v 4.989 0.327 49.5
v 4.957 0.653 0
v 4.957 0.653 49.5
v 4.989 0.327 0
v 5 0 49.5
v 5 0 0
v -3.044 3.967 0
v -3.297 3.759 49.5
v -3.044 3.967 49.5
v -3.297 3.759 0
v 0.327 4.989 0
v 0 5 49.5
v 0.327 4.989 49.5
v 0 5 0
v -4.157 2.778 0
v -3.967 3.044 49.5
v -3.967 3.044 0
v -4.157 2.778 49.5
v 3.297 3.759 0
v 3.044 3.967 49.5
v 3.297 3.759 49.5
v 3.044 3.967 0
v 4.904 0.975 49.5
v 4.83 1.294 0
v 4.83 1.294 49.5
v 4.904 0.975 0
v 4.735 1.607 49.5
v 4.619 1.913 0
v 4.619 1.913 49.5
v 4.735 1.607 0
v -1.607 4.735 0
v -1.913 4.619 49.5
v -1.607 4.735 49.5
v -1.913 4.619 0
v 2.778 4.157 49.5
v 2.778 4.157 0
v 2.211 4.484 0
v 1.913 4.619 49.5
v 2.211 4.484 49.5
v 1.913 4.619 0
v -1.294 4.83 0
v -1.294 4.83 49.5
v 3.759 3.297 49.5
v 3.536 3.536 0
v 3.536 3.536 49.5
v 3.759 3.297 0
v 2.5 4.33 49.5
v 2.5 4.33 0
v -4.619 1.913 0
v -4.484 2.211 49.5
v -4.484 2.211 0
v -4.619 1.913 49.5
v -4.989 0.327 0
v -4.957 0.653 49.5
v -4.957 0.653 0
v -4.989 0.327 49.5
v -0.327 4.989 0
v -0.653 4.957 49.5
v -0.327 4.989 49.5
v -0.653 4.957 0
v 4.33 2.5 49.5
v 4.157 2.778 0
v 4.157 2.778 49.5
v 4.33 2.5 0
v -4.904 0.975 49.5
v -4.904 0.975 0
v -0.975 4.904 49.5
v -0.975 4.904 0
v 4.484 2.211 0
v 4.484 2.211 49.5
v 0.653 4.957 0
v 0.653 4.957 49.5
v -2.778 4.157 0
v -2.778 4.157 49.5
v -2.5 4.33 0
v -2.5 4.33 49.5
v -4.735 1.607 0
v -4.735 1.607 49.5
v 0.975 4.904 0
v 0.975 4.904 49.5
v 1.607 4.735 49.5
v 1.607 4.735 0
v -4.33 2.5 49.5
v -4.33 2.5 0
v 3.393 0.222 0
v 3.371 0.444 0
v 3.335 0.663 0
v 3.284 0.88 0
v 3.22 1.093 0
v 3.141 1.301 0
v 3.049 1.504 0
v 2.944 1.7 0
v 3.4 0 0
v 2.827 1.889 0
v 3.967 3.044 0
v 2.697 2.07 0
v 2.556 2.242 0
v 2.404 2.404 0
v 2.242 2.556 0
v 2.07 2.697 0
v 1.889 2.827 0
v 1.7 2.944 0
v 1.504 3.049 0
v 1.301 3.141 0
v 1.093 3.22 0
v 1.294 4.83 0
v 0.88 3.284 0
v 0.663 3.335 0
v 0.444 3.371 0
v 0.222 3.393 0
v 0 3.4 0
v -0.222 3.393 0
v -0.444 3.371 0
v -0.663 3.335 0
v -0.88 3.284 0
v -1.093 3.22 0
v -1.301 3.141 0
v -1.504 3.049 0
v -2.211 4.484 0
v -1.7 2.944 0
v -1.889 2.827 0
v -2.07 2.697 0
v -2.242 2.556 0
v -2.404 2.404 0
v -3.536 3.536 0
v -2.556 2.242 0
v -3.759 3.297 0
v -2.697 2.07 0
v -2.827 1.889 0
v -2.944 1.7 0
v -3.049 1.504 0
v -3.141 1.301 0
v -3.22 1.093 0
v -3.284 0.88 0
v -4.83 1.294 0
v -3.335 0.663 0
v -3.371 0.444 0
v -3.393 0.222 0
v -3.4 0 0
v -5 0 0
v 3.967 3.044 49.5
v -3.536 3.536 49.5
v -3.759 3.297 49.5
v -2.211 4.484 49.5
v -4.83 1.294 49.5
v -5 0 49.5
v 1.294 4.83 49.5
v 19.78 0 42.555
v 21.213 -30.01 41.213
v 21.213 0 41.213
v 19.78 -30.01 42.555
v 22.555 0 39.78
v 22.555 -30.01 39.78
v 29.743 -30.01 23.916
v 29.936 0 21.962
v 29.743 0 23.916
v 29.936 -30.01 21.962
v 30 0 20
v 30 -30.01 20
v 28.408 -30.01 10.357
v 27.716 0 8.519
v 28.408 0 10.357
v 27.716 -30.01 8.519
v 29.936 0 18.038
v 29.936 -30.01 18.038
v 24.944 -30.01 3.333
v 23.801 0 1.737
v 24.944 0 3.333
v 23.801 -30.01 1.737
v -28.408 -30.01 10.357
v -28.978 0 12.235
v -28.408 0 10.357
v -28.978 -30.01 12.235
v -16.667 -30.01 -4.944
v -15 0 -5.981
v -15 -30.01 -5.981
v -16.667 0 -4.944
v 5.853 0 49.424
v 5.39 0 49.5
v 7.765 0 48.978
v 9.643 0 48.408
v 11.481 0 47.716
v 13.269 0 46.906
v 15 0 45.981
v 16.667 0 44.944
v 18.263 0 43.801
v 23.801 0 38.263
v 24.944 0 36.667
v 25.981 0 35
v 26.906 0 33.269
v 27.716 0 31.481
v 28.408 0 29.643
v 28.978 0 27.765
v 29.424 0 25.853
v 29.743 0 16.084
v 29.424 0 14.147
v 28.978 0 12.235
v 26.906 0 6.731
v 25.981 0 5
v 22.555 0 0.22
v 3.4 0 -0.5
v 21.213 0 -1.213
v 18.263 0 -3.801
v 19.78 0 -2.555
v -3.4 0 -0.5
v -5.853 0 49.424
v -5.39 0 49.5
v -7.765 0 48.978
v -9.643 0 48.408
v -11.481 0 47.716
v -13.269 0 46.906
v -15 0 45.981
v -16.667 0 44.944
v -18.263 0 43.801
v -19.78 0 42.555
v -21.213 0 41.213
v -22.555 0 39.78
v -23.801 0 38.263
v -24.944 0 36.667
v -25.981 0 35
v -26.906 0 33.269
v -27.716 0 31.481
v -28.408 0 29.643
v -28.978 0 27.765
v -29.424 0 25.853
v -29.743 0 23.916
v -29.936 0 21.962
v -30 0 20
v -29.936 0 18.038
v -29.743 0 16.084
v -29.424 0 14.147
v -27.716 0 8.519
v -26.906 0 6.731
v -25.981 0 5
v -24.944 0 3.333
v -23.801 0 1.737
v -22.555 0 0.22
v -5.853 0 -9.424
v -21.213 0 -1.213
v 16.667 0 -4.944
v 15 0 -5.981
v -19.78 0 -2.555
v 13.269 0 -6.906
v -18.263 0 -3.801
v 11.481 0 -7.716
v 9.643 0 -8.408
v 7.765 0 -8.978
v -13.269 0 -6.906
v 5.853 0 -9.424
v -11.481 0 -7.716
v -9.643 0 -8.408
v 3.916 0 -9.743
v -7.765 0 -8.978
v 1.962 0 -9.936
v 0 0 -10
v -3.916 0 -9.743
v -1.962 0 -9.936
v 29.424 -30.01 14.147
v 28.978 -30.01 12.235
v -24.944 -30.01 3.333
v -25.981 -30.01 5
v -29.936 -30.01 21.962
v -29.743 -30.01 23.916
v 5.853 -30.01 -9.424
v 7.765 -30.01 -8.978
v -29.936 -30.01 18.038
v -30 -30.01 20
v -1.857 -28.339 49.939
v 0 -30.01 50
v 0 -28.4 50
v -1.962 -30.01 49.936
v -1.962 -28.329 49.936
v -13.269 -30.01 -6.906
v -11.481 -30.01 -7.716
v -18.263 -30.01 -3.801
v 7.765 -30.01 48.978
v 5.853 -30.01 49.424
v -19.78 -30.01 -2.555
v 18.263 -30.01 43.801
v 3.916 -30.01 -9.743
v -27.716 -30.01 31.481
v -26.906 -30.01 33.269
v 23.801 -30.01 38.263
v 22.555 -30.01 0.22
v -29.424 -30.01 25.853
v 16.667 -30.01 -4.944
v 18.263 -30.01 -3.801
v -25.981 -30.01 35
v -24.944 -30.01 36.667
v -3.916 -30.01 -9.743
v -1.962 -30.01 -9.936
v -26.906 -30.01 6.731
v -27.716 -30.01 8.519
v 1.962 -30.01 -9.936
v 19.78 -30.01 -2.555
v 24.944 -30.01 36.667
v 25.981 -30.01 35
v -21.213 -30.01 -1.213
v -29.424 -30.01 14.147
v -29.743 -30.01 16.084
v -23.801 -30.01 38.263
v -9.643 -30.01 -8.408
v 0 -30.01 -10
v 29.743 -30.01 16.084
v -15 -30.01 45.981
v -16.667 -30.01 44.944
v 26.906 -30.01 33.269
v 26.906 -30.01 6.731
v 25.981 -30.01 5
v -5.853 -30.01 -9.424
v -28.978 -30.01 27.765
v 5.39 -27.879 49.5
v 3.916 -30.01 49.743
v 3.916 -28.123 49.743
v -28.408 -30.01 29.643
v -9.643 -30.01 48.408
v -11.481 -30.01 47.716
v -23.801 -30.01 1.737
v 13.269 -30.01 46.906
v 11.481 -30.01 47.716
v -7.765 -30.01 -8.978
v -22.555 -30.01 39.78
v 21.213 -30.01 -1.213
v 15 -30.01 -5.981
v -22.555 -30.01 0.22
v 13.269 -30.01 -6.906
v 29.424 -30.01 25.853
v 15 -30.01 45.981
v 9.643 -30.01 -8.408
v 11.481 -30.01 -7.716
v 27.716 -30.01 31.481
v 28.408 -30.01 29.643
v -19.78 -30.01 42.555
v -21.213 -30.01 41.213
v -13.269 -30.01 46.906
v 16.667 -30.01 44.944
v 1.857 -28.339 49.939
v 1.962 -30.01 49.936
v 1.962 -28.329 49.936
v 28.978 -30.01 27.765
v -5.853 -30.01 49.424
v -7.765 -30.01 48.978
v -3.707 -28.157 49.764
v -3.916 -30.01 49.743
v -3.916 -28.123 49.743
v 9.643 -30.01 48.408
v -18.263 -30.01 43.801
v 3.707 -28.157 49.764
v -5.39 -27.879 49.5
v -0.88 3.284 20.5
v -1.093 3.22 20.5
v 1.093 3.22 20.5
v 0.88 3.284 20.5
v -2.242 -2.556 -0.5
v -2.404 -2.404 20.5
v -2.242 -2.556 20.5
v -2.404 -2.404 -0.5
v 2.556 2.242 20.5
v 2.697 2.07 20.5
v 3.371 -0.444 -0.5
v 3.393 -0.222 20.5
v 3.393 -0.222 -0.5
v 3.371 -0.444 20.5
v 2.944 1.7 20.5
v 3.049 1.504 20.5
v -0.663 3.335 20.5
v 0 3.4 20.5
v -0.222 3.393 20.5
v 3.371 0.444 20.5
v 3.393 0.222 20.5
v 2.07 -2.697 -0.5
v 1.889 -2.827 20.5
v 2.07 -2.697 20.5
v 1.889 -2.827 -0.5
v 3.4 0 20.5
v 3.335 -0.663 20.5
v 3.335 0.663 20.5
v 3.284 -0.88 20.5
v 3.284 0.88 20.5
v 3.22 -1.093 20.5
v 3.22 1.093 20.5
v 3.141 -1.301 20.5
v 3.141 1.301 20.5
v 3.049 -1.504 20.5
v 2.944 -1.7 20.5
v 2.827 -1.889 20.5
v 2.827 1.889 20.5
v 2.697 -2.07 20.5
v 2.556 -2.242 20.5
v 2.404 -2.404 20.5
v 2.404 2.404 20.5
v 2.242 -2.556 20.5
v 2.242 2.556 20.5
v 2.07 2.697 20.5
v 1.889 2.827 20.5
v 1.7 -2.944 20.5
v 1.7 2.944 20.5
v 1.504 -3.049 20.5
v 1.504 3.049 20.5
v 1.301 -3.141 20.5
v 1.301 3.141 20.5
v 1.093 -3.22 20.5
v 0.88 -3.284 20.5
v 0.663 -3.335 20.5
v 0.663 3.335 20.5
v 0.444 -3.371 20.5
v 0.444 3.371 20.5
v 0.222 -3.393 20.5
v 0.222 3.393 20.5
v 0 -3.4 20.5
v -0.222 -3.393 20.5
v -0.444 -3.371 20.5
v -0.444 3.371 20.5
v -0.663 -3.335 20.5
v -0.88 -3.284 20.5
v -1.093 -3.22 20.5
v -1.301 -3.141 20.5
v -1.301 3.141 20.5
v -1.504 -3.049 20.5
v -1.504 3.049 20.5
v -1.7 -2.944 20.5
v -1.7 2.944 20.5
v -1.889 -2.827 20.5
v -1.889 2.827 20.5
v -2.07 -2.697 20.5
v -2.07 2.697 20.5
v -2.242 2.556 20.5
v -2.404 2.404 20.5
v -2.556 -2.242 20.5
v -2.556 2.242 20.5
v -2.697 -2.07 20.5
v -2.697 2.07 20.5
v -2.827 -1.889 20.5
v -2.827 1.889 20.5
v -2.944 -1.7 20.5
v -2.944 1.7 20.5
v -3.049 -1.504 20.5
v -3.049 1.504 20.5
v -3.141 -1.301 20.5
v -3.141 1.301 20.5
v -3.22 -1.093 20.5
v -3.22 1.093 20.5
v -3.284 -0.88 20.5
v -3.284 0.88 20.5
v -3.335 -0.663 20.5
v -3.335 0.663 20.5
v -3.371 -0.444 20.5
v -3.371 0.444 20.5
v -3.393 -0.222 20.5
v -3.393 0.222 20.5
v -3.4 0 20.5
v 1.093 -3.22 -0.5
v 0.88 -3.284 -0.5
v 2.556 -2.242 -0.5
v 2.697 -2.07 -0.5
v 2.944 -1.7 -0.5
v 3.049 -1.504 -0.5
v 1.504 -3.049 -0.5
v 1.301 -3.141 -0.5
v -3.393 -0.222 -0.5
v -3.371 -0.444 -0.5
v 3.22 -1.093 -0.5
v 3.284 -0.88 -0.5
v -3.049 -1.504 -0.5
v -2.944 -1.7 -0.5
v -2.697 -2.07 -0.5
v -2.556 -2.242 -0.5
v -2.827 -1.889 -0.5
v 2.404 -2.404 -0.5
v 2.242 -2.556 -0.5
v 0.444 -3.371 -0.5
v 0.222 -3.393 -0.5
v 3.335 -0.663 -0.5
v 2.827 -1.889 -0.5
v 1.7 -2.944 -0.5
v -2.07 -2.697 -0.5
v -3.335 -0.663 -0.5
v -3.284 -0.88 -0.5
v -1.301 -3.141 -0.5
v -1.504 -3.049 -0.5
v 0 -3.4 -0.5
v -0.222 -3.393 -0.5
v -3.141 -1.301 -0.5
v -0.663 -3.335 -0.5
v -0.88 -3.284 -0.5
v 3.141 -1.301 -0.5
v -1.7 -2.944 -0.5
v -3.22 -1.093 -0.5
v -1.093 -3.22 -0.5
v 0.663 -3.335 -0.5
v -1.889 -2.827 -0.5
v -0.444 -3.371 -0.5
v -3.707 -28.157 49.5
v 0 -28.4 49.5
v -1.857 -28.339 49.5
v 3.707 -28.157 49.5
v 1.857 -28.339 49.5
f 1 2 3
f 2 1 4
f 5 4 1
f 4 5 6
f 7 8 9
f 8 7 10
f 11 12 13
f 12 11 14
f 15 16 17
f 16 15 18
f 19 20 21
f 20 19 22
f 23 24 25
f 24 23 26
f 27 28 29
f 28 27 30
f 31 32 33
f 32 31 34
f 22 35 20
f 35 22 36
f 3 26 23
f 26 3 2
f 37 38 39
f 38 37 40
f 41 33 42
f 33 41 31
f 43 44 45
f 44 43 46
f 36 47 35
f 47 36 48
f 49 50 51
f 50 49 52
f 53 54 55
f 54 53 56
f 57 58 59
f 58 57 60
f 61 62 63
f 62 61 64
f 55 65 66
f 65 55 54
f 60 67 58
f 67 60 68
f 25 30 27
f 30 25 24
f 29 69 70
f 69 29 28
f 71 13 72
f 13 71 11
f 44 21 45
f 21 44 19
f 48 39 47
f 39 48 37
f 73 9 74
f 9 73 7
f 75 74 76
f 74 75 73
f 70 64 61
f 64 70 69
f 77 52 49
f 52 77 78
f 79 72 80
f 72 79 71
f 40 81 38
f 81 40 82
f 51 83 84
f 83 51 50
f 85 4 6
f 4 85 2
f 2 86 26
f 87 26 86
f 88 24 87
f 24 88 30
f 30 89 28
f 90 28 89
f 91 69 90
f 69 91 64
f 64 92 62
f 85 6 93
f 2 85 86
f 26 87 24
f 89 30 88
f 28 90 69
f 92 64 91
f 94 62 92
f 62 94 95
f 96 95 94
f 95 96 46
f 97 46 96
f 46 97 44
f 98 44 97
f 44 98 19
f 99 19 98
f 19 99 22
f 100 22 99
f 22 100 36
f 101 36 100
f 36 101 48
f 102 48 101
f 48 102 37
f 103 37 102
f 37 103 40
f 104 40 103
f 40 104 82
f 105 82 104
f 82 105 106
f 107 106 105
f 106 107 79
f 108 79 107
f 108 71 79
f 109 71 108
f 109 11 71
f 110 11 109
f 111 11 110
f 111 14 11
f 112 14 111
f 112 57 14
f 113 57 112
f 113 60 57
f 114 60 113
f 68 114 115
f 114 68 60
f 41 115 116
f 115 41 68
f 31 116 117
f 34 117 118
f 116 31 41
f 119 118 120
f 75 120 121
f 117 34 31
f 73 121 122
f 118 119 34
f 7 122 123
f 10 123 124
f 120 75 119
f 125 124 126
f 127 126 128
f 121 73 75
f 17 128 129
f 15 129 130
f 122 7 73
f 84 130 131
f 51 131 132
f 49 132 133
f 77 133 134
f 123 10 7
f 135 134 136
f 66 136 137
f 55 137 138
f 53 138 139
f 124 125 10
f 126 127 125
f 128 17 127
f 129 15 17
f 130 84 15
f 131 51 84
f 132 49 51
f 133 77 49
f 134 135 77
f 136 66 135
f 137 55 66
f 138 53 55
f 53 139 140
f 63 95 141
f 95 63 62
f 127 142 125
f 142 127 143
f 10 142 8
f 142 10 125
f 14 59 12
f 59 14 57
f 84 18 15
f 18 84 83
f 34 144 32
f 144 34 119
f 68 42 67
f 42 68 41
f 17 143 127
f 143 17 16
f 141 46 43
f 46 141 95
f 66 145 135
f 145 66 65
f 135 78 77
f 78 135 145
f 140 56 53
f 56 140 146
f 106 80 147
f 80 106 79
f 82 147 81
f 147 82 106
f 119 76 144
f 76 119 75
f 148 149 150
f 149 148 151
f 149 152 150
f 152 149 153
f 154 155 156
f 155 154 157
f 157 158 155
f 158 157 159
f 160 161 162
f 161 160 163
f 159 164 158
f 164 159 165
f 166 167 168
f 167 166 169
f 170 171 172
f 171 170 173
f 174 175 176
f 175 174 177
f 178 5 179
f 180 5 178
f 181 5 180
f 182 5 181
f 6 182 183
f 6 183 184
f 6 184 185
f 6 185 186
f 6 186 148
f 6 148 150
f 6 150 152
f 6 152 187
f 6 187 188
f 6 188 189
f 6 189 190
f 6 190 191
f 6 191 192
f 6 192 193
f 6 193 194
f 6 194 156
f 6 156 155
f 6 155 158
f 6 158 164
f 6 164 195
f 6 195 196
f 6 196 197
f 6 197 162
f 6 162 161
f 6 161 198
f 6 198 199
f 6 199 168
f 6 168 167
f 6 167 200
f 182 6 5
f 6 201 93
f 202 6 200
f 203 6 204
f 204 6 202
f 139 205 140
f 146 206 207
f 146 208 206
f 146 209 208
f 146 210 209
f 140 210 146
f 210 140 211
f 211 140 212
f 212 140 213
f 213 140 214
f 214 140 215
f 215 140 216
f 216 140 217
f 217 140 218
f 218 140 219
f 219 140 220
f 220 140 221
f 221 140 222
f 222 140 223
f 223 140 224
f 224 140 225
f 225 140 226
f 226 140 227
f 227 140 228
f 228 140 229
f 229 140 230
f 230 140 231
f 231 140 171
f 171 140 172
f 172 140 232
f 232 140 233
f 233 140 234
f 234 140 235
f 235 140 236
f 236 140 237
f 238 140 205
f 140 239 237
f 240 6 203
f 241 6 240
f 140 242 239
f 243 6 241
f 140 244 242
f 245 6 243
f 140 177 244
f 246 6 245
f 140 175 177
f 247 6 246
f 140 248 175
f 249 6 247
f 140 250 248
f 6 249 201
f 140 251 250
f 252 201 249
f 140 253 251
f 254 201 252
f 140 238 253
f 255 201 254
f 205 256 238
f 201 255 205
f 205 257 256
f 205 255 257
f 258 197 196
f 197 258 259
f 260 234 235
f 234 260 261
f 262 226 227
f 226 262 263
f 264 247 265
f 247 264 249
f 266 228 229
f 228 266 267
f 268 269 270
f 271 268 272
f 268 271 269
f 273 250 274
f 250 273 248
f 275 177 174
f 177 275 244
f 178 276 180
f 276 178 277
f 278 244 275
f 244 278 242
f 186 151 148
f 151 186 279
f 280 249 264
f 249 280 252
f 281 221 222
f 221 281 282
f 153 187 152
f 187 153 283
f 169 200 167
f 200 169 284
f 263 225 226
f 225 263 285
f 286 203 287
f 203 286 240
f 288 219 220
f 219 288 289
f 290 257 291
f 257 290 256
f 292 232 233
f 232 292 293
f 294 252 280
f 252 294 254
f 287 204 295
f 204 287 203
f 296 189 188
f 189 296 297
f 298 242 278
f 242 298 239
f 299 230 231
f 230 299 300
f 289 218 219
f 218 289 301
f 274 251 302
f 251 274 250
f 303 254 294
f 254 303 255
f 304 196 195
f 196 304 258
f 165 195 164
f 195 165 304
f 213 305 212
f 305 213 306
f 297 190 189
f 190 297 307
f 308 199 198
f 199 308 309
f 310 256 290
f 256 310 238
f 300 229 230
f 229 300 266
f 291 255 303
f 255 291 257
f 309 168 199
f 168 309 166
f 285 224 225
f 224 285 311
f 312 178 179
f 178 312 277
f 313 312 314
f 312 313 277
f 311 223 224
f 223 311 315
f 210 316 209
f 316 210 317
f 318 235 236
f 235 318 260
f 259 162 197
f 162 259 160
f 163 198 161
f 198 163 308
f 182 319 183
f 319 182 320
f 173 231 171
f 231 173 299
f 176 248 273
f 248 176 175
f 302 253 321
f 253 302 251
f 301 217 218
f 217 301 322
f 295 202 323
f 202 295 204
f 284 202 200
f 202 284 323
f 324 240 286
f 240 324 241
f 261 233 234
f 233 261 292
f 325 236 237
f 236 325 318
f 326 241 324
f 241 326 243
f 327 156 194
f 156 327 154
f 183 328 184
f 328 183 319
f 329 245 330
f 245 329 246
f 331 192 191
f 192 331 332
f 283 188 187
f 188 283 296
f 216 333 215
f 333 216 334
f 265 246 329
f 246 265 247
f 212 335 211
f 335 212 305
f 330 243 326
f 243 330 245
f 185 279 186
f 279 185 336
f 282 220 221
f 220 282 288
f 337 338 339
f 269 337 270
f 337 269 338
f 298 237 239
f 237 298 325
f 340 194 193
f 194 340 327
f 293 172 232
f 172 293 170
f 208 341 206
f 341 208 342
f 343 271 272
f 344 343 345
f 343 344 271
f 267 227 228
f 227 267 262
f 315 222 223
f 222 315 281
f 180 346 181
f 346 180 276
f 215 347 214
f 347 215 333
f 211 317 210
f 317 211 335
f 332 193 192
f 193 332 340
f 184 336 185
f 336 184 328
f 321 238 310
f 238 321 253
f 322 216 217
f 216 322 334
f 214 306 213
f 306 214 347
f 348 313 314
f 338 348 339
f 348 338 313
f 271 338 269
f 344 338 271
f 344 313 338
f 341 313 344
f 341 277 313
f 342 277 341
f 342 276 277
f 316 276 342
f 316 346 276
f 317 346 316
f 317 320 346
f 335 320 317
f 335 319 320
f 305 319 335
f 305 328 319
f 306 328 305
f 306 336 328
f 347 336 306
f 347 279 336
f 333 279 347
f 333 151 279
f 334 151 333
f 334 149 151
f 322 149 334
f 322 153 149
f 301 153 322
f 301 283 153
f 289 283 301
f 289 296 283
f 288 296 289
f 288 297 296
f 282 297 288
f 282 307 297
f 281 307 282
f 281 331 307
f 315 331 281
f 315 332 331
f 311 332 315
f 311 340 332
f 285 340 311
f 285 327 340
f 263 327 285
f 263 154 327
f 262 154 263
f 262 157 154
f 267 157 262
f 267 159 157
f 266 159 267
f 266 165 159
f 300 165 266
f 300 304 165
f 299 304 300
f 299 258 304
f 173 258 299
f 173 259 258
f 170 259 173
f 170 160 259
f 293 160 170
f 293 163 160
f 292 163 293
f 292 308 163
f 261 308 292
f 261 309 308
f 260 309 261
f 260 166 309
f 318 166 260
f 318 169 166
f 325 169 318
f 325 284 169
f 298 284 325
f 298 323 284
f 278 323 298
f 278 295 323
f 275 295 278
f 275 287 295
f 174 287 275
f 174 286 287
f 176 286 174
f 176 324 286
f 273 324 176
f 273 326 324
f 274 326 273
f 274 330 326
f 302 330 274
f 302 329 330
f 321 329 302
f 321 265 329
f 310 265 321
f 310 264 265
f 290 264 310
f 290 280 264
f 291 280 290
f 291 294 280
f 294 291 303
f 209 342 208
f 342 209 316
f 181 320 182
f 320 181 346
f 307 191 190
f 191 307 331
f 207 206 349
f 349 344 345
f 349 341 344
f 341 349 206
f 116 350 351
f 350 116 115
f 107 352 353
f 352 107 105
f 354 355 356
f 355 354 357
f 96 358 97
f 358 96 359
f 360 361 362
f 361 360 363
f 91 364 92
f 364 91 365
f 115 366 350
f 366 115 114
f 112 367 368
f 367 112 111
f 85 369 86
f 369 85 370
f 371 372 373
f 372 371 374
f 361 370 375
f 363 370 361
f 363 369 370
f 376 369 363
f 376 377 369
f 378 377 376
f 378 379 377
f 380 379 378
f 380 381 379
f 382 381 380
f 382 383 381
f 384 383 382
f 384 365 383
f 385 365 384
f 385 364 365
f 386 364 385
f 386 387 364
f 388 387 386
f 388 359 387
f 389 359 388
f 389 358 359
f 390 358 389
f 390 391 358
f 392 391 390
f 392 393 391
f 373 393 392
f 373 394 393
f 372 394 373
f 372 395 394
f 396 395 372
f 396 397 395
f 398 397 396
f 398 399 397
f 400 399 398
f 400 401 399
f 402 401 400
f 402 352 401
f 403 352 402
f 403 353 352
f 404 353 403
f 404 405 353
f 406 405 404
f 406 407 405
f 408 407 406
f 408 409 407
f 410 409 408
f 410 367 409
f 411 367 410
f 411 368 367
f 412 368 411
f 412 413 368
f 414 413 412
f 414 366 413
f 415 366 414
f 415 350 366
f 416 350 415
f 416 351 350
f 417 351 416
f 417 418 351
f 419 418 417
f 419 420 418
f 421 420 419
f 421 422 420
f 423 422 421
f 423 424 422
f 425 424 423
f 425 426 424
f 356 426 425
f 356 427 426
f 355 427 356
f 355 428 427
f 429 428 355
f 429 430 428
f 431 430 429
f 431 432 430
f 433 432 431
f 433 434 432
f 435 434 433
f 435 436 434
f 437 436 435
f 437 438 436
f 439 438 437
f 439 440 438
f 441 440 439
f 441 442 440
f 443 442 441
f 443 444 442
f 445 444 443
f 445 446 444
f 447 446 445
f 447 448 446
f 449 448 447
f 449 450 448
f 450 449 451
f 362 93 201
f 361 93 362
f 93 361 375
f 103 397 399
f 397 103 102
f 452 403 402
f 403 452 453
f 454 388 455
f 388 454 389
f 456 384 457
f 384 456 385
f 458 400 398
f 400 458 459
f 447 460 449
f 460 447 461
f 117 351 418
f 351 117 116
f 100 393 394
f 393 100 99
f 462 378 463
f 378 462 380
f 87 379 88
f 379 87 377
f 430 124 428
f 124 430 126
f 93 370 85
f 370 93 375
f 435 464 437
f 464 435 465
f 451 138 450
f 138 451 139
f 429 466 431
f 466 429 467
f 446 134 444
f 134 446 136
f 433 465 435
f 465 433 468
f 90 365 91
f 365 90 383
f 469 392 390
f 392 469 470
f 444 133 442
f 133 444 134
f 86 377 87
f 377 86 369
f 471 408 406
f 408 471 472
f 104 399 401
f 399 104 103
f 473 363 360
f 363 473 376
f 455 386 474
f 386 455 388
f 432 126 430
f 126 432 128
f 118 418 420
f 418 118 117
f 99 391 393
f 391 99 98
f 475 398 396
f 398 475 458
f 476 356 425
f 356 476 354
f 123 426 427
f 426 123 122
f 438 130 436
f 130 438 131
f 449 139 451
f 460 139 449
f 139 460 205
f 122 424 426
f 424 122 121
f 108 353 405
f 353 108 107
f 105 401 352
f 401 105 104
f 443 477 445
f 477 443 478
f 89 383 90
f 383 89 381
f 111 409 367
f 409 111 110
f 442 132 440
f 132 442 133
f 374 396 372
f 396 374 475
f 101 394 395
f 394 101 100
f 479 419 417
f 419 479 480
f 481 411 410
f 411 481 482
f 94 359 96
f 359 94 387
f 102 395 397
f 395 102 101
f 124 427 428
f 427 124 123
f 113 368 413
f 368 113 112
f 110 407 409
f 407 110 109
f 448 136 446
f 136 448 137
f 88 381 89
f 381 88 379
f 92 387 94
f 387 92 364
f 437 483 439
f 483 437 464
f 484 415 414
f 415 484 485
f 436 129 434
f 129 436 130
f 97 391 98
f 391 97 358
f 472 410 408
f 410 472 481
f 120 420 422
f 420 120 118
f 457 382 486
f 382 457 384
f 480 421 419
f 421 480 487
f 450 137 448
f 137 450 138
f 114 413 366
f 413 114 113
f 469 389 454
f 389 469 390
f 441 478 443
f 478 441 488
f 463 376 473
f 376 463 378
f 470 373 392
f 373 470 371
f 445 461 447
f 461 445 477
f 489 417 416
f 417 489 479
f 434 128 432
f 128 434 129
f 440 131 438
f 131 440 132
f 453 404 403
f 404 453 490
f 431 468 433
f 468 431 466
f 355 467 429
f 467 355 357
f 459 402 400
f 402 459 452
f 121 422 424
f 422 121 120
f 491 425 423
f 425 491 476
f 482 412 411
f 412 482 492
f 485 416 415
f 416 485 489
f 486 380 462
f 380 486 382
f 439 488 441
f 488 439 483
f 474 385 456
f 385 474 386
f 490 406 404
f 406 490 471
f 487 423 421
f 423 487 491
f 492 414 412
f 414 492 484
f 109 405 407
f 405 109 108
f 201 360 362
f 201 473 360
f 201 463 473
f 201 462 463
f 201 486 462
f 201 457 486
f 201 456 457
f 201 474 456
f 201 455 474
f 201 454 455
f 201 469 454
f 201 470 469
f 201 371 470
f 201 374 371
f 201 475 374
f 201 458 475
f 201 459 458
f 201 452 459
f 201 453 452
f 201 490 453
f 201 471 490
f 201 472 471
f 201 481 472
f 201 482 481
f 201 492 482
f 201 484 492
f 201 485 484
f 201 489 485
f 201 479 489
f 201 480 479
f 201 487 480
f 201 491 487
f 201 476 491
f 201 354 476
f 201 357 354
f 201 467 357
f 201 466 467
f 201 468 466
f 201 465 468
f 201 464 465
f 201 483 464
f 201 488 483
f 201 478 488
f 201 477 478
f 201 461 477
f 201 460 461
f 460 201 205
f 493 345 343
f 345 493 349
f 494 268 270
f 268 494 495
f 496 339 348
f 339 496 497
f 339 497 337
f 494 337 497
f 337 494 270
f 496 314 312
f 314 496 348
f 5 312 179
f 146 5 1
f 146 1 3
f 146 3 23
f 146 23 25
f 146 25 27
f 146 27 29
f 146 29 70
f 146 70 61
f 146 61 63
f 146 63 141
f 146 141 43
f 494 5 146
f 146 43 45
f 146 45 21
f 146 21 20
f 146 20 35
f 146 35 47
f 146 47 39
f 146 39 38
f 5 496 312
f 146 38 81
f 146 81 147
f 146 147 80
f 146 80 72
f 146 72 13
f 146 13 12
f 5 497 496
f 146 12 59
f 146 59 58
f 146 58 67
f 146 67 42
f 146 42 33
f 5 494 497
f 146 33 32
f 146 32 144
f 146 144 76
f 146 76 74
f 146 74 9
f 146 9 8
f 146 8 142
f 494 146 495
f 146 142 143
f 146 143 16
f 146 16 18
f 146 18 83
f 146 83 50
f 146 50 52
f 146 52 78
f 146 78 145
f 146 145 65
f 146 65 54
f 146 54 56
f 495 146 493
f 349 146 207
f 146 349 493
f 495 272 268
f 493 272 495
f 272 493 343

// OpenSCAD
// Lab funnel - printed upright, open top and bottom
// Units: mm. One complete part, no external libraries.

// ---- Parameters ----
spout_od      = 10;    // spout outer diameter
spout_length  = 20;    // spout runs from z = 0 to z = 20
cone_top_d    = 10;    // cone outer diameter at z = 20 (spout/cone overlap)
cone_rim_d    = 60;    // cone rim outer diameter at z = 50
wall          = 1.6;   // uniform wall thickness
eps           = 0.5;   // cutter overshoot past faces

$fn = 96;              // smoothness of curved shapes

// ---- Derived ----
spout_id = spout_od - 2 * wall;   // spout bore (6.8 mm)
cone_h   = 50 - 20;               // cone height (30 mm)

// ---- Model ----
difference() {
    union() {
        // Spout: straight tube from z = 0 to z = 20
        cylinder(d = spout_od, h = spout_length, $fn = 96);

        // Cone: widens from 10 mm at z = 20 to 60 mm at z = 50
        translate([0, 0, spout_length])
            linear_extrude(height = cone_h, copy = true)
                circle(d = cone_top_d);
        translate([0, 0, spout_length])
            rotate([90, 0, 0])
                linear_extrude(height = cone_h + 0.01, copy = true)
                    circle(d = cone_rim_d);
    }

    // ---- Openings (through the whole part) ----
    // 1. Bottom of spout
    translate([0, 0, -eps])
        cylinder(d = spout_id, h = spout_length + 2 * eps);

    // 2. Top rim: cut the 1.6 mm wall around the 60 mm opening
    translate([0, 0, 50 - eps])
        cylinder(d = cone_rim_d - 2 * wall, h = wall + eps);
}
